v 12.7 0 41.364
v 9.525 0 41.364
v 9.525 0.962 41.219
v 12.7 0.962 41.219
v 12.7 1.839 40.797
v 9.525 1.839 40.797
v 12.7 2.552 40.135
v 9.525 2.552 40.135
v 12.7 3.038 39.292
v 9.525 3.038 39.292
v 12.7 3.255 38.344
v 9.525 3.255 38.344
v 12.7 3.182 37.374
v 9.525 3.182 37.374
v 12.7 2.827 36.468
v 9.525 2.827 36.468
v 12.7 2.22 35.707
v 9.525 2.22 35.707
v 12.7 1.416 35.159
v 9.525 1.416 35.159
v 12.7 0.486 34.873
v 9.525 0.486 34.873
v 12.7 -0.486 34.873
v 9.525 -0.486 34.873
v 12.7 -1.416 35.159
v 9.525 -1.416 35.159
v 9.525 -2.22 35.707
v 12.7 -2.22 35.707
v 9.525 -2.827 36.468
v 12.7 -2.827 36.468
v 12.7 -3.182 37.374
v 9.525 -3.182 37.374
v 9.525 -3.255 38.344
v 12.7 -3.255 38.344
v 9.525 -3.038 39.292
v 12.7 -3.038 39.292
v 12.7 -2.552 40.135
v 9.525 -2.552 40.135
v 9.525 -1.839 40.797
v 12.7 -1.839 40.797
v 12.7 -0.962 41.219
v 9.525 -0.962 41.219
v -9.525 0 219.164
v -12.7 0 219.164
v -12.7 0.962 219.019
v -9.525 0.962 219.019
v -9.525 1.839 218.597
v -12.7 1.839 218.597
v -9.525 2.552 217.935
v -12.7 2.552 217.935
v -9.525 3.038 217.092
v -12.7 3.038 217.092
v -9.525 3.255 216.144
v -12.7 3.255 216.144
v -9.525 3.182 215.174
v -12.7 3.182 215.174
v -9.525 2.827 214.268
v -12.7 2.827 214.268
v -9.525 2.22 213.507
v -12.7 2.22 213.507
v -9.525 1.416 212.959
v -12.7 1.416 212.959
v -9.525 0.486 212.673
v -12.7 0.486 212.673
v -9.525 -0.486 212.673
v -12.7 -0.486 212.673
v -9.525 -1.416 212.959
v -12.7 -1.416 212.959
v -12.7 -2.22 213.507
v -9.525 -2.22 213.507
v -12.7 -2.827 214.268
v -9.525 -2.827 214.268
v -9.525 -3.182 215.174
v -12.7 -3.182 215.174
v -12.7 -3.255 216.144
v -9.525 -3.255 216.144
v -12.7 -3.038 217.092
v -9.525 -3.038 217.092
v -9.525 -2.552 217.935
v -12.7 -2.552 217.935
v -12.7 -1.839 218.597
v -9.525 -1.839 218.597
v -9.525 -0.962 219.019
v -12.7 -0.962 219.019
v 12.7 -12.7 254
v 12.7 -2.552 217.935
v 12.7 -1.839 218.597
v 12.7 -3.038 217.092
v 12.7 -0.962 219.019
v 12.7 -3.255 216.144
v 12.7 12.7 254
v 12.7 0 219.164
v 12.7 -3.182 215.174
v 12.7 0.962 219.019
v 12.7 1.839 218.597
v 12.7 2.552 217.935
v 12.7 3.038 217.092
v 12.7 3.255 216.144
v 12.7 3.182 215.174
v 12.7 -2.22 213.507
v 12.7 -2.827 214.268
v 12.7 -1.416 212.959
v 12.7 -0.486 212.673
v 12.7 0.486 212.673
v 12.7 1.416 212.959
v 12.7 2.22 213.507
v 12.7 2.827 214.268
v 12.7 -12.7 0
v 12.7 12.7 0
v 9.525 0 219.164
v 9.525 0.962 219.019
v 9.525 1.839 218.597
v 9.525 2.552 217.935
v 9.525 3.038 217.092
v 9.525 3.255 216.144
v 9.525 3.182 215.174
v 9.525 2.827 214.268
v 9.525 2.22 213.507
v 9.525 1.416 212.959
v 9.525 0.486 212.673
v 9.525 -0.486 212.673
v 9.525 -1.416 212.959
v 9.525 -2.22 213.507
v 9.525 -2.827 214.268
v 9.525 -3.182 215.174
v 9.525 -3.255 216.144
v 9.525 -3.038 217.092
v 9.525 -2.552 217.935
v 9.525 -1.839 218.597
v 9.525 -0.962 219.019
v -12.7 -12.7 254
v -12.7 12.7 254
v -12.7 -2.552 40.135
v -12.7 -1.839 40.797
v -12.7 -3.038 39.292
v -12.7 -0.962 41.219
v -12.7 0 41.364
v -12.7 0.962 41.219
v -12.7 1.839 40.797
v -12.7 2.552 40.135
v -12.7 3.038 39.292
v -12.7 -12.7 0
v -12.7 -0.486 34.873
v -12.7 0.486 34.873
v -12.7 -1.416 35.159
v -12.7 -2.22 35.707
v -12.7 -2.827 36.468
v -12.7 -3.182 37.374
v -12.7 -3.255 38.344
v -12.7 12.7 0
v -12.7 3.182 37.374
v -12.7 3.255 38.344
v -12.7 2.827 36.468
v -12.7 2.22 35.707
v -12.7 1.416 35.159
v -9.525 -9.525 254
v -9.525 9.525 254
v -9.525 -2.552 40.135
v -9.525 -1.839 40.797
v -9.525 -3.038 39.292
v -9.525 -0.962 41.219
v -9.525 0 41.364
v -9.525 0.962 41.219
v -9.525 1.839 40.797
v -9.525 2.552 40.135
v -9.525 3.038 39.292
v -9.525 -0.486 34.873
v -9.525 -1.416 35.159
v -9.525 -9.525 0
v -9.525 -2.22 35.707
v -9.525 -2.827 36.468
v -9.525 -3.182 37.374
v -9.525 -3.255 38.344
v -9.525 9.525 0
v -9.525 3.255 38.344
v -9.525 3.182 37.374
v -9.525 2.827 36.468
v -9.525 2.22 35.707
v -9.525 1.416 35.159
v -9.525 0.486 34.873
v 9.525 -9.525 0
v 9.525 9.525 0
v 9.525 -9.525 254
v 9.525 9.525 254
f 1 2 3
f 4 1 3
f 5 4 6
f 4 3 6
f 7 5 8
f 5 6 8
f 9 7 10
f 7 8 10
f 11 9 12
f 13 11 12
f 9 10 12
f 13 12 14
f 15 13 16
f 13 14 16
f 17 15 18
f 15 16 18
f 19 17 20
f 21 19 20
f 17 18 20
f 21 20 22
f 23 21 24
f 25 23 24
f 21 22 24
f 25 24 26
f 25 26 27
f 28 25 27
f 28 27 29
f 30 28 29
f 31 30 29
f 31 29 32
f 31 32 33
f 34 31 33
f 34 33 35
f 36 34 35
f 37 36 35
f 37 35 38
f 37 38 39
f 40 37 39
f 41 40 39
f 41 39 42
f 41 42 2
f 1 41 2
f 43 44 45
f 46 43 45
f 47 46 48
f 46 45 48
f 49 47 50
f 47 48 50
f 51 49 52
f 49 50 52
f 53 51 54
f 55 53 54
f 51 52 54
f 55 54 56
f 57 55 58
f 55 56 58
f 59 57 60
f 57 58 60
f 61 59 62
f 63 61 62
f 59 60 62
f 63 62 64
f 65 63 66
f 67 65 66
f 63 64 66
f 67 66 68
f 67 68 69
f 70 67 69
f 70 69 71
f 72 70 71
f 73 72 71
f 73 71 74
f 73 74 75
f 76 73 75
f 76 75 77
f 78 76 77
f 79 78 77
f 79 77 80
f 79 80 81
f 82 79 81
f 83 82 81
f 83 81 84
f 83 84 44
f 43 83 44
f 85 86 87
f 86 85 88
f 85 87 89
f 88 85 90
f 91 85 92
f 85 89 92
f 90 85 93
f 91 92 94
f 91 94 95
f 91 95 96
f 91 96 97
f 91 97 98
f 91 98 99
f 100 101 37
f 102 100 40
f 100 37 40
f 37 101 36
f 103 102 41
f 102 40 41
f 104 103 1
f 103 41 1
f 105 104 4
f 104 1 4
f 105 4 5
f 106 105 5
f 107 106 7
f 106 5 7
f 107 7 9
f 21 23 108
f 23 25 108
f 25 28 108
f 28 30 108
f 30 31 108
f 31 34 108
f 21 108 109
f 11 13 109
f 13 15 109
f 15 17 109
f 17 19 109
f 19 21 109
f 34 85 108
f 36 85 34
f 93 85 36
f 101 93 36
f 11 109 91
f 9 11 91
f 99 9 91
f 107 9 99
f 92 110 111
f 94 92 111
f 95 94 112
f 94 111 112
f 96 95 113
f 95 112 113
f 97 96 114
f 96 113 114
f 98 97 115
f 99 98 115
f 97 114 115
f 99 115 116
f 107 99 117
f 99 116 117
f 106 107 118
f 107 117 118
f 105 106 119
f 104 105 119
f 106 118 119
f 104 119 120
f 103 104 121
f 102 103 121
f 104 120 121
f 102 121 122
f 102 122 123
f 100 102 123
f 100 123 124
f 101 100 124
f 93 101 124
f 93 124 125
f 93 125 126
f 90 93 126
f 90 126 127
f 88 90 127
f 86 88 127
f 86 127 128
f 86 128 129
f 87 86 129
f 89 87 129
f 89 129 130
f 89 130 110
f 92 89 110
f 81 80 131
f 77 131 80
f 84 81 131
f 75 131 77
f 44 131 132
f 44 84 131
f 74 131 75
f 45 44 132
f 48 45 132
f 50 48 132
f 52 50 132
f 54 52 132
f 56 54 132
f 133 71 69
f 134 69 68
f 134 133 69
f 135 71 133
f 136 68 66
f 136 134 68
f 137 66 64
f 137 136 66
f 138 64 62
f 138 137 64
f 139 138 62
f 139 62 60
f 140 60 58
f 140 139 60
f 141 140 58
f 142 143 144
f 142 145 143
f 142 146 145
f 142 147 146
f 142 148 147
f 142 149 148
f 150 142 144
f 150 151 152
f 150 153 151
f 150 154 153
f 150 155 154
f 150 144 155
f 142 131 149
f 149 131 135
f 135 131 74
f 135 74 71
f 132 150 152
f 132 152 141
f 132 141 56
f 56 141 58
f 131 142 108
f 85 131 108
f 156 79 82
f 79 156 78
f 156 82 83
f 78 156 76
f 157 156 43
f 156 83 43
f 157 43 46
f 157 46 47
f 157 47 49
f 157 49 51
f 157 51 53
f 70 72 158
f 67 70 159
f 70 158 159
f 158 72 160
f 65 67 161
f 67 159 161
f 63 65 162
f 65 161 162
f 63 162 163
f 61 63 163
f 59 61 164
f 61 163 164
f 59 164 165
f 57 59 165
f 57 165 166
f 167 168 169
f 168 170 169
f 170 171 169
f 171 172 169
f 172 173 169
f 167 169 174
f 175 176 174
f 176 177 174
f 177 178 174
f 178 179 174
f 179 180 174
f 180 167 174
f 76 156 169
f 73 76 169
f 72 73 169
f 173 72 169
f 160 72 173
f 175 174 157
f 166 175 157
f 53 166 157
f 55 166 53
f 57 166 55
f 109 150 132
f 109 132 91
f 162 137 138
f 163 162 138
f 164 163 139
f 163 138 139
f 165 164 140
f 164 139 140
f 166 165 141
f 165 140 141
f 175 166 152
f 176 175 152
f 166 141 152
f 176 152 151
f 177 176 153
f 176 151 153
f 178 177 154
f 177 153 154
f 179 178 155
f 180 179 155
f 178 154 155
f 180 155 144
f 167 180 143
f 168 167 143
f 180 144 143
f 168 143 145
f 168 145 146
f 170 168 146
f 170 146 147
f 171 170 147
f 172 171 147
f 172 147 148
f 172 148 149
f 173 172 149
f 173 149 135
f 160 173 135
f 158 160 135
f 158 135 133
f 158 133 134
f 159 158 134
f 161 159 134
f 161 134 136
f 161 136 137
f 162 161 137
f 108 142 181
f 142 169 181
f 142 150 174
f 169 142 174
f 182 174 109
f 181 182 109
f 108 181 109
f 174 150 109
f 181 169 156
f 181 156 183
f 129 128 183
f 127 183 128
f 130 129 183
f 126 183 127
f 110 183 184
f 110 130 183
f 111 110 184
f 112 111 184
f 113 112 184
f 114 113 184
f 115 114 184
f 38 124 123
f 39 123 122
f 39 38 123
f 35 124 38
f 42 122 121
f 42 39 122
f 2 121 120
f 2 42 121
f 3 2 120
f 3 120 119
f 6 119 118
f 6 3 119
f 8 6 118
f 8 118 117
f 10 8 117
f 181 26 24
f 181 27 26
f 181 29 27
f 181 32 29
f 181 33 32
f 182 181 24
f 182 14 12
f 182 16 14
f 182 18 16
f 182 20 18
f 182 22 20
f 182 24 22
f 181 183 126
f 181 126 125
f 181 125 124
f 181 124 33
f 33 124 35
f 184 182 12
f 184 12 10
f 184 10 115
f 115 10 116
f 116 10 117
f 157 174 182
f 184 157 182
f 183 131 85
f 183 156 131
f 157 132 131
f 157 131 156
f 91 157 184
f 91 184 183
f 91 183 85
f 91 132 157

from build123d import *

# Parameters (mm, degrees)
SKETCH1_W                = 25.4
SKETCH1_H                = 25.4
SKETCH1_W_2              = 19.05
SKETCH1_H_2              = 19.05
BOSS_EXTRUDE1_DEPTH      = 254
F_0_257_DIAMETER_HOLE1_D = 6.5278


with BuildPart() as part:
    # Sketch1 → Boss-Extrude1 (new body)
    with BuildSketch(Plane.XY):
        Rectangle(SKETCH1_W, SKETCH1_H)
        Rectangle(SKETCH1_W_2, SKETCH1_H_2, mode=Mode.SUBTRACT)
    extrude(amount=BOSS_EXTRUDE1_DEPTH)

    # F (0.257) Diameter Hole1 (through all)
    with Locations(Plane(origin=(12.7, 0, 0), x_dir=(0, 0, -1), z_dir=(1, 0, 0))):
        with Locations((-215.9, 0), (-38.1, 0)):
            Hole(F_0_257_DIAMETER_HOLE1_D / 2)


solid = part.part
